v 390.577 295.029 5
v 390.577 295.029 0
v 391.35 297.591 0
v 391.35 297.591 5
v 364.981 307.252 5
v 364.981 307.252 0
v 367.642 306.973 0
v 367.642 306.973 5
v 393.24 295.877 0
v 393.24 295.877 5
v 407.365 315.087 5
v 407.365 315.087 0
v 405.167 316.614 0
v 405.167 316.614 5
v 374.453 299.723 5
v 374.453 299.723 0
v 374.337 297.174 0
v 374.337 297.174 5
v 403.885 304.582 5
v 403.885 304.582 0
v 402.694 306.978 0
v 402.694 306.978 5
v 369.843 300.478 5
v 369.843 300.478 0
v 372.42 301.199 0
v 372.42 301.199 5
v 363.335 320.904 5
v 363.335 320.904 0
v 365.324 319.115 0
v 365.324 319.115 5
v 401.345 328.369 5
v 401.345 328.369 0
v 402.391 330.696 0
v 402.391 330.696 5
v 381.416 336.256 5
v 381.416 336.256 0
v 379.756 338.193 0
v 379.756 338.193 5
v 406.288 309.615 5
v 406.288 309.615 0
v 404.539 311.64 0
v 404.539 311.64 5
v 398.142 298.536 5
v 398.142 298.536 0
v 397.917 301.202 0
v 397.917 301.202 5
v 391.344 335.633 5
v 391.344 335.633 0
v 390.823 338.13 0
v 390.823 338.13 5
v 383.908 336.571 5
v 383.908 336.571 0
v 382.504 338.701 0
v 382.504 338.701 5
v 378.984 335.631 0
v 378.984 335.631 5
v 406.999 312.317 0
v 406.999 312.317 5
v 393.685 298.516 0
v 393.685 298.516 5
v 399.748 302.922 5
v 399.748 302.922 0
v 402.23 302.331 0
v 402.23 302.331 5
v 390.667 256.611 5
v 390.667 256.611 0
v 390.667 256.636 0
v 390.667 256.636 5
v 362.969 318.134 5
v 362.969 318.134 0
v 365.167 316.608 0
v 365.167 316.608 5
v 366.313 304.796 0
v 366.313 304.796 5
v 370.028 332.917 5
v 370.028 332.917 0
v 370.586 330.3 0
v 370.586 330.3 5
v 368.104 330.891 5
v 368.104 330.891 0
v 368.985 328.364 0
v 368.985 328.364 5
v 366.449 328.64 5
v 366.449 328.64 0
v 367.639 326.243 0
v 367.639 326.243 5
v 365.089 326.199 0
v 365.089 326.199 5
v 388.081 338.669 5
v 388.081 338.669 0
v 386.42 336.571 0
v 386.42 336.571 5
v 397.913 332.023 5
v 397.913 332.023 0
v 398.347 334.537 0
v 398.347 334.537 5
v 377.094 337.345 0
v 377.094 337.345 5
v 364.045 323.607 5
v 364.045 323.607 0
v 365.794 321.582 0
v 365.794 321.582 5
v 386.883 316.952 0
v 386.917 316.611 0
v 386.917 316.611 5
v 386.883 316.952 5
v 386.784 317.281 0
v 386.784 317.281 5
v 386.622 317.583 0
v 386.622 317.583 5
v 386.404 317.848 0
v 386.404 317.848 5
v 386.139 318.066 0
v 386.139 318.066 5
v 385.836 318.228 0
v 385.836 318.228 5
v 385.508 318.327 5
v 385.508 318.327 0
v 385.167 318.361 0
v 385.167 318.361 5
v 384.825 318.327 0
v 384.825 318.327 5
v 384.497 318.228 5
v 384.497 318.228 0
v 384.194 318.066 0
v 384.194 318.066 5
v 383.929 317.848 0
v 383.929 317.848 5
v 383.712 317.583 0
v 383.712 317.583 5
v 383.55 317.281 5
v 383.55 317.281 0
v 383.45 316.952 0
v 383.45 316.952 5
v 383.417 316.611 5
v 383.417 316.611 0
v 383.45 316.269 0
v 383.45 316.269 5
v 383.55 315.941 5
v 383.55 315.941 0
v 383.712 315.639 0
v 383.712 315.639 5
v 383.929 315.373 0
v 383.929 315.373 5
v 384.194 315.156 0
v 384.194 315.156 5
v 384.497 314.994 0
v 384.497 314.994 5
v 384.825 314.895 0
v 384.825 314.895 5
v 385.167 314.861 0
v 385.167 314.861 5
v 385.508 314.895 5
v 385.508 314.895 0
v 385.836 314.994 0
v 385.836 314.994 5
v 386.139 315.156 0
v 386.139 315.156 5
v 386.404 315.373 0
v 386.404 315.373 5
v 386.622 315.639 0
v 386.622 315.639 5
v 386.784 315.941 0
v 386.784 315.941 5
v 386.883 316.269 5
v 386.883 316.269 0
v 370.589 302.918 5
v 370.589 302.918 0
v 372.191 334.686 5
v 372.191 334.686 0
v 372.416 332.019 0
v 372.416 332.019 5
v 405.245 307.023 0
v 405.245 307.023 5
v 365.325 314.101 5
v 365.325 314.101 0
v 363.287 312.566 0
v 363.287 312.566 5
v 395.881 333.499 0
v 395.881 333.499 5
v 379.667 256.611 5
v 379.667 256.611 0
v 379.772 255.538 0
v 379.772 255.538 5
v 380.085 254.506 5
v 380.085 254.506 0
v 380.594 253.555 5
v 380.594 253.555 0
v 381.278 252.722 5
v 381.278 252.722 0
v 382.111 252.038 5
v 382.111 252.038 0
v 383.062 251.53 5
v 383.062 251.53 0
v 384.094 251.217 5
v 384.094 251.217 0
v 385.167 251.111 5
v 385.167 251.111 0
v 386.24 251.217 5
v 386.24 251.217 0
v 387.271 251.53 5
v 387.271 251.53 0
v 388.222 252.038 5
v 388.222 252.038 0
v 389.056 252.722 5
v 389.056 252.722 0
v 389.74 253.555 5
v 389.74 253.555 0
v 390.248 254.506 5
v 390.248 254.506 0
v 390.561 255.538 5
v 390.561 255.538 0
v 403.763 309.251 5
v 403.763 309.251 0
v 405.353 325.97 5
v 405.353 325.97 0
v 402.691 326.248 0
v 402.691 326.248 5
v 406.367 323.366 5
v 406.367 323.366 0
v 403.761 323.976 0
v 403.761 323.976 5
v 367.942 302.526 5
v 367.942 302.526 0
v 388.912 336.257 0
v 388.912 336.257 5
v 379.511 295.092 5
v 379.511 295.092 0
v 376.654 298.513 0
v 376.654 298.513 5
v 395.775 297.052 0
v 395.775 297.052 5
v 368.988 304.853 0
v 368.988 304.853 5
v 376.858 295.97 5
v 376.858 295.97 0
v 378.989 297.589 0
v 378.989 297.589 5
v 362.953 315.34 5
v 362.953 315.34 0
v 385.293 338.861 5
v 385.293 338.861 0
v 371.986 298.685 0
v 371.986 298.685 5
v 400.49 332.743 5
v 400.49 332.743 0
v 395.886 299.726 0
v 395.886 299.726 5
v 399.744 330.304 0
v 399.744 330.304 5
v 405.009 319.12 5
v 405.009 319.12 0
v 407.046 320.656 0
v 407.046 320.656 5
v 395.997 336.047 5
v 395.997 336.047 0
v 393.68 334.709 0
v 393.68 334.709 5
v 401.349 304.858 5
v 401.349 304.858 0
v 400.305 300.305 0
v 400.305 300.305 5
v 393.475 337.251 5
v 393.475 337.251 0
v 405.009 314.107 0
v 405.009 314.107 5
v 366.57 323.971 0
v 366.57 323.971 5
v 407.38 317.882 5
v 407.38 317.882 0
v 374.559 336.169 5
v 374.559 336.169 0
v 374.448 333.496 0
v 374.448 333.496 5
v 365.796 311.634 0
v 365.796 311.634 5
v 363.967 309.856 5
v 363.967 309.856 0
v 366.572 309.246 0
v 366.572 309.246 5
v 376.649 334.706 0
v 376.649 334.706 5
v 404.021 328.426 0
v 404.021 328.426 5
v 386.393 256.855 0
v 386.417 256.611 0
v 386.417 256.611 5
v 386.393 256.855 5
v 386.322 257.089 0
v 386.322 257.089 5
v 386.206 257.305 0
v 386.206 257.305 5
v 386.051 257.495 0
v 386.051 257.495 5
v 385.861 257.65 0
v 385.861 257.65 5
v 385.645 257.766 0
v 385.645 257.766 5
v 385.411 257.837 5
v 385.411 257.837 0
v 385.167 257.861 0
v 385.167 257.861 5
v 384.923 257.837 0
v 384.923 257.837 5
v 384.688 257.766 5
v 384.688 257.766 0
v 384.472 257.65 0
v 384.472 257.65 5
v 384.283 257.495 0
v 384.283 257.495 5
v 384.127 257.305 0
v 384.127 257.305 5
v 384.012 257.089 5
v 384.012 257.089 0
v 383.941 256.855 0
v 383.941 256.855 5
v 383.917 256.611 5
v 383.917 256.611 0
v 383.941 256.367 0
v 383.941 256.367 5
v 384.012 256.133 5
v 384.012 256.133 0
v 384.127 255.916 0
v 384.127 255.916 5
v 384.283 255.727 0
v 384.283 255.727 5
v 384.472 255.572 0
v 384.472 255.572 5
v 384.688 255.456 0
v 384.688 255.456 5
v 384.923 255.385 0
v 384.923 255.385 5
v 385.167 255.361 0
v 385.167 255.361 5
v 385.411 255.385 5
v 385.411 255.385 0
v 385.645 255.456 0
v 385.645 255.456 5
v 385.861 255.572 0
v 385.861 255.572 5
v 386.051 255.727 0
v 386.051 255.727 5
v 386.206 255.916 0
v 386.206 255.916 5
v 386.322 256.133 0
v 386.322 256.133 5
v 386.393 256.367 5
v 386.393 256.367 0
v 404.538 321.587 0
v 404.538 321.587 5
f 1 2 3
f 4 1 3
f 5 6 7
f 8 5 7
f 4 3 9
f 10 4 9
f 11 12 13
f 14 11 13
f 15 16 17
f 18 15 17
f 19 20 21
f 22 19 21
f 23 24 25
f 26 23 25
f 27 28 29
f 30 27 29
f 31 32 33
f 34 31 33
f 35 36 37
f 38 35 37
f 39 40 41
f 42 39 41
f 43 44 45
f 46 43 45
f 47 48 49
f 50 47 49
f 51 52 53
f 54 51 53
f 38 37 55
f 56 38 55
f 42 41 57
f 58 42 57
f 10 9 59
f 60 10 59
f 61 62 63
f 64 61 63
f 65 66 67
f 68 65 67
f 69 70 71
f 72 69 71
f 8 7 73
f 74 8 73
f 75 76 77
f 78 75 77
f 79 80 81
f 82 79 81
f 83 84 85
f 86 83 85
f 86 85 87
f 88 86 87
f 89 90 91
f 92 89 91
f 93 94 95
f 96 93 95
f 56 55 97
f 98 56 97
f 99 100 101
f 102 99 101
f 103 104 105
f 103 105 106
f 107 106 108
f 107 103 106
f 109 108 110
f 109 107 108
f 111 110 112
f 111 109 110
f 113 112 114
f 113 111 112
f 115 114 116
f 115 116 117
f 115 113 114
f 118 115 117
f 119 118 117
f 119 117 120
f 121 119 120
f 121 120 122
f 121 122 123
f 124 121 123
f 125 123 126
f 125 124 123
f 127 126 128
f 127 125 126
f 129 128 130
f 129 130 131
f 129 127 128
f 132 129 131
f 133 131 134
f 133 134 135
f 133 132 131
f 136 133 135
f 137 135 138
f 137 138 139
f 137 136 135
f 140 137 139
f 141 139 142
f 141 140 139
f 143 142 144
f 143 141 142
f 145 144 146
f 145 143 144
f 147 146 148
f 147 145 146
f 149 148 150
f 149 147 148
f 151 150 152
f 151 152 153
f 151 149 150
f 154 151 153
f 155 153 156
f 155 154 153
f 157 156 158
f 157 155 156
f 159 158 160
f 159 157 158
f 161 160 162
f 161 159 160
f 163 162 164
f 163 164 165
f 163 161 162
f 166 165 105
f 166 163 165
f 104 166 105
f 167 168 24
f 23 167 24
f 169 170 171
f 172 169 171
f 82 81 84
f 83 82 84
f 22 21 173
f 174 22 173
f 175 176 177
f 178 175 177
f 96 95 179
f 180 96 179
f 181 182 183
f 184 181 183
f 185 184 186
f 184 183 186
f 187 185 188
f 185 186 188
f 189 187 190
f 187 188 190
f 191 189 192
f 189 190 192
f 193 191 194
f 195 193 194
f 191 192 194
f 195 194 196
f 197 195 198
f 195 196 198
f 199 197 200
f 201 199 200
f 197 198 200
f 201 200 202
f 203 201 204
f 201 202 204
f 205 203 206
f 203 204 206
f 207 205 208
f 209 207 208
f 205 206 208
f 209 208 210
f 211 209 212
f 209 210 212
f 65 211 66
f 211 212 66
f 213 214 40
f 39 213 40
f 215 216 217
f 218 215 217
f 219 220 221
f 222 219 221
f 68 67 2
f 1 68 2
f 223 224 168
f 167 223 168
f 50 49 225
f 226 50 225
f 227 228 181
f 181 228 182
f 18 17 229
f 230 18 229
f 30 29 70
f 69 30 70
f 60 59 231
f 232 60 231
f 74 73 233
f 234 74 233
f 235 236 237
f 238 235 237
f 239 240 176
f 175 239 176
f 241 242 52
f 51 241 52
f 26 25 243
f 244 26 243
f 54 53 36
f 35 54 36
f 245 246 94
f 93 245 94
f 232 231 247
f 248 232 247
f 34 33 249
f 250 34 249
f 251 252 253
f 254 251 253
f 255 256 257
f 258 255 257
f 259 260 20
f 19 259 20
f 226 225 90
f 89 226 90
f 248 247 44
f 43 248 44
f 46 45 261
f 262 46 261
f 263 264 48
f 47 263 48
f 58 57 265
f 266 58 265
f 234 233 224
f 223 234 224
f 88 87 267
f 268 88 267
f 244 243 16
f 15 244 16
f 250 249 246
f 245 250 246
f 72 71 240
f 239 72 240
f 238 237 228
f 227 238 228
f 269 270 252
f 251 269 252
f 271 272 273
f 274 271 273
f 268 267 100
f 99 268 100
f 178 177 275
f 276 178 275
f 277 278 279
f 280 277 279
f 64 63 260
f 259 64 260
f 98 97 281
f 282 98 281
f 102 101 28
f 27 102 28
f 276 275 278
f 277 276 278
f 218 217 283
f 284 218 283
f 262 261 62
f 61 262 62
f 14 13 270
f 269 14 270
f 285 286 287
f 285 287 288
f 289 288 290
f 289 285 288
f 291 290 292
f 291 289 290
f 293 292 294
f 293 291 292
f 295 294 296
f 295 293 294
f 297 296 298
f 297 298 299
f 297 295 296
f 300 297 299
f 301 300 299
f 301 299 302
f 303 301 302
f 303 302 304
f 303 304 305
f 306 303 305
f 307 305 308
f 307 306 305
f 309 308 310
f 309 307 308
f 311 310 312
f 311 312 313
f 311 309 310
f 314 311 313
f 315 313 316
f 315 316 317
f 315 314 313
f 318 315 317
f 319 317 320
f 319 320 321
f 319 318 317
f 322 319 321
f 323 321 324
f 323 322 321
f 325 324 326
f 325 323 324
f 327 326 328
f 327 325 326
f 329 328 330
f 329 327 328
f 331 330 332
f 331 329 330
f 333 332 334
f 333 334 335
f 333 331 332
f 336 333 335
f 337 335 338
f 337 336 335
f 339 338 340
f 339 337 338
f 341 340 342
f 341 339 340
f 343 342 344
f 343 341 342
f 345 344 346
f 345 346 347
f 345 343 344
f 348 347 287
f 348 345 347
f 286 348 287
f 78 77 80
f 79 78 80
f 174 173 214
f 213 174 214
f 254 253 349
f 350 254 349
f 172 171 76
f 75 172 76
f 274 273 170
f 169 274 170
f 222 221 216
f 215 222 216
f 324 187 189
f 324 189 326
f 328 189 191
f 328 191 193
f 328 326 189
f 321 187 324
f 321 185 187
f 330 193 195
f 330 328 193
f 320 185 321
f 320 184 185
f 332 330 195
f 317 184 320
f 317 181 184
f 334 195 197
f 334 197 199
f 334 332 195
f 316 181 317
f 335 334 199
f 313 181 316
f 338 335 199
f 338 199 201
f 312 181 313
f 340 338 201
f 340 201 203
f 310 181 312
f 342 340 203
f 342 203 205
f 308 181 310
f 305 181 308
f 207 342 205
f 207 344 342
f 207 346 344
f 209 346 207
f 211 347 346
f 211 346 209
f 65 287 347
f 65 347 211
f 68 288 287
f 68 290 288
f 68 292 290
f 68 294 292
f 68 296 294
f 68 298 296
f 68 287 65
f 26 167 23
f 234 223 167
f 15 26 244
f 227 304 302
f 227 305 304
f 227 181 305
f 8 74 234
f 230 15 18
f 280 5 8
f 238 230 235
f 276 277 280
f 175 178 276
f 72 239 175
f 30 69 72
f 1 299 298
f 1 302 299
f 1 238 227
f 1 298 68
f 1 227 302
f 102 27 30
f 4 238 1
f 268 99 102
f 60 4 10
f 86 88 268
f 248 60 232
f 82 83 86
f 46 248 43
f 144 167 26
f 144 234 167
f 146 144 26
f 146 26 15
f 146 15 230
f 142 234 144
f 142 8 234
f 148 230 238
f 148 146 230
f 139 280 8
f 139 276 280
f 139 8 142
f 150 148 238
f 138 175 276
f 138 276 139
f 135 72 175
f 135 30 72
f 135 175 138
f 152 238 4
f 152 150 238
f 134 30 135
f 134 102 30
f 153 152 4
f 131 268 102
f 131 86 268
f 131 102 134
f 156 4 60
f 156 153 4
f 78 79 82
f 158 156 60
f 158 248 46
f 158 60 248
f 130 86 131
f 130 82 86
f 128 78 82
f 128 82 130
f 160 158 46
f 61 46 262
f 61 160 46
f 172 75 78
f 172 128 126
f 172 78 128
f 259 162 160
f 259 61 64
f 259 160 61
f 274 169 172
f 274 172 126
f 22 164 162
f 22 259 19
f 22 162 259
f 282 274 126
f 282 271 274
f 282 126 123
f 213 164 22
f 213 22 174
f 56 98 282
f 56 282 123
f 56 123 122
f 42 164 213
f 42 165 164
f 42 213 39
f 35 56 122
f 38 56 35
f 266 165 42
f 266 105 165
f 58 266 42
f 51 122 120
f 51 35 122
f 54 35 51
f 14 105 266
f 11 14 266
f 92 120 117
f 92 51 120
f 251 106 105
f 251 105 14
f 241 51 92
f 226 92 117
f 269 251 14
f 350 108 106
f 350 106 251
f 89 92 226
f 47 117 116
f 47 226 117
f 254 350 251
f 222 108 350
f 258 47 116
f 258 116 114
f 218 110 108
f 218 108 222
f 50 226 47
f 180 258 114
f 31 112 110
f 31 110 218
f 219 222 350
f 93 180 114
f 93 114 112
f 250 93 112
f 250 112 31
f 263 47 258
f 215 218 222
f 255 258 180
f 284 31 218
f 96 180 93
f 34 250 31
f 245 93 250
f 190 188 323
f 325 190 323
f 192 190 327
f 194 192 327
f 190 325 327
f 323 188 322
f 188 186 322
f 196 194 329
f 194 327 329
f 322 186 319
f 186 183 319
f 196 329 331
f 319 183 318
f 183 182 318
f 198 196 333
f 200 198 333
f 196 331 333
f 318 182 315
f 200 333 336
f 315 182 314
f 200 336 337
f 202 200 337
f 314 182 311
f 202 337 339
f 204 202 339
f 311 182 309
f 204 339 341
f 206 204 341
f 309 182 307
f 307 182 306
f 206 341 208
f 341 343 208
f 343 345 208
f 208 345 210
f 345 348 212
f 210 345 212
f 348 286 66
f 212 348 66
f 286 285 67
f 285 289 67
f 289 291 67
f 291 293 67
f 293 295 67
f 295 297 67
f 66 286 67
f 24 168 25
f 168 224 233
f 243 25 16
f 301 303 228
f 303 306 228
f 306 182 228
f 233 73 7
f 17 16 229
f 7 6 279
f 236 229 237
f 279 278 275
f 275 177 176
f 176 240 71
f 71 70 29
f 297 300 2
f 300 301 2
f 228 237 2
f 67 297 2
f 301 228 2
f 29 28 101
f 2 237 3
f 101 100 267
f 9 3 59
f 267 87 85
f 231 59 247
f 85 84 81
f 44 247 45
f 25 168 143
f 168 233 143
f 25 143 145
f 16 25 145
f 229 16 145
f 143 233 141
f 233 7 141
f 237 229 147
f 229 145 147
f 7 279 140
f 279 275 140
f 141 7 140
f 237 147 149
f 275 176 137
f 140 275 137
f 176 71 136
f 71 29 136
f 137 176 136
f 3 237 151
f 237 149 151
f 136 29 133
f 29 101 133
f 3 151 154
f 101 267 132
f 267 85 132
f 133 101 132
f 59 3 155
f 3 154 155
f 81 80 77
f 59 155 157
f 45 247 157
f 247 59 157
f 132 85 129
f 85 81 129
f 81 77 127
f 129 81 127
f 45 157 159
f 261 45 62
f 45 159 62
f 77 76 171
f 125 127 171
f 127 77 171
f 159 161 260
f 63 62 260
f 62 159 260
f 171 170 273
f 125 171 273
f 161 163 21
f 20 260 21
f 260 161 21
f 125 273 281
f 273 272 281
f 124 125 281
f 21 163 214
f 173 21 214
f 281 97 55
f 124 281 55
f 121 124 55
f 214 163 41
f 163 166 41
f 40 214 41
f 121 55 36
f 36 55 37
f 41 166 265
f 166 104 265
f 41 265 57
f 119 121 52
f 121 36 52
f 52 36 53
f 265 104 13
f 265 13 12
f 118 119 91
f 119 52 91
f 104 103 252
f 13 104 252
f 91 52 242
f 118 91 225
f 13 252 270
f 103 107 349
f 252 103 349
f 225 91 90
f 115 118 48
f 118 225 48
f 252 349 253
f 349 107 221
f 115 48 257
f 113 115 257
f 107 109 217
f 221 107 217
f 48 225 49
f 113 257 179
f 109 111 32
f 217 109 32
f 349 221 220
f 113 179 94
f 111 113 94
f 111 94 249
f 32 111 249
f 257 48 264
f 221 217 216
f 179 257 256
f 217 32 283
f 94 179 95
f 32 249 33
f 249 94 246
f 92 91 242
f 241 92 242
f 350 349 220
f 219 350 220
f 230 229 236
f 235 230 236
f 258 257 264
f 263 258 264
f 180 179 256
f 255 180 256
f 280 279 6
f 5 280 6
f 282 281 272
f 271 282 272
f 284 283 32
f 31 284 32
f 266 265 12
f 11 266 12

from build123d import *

# Parameters (mm, degrees)
SKETCH1_R           = 1.25
SKETCH1_R_2         = 1.75
BOSS_EXTRUDE2_DEPTH = 5


with BuildPart() as part:
    # Sketch1 → Boss-Extrude2 (new body)
    with BuildSketch(Plane.XY):
        with BuildLine():
            Line((386.419721239, 336.571497364), (385.293365012, 338.860526411))
            Line((385.293365012, 338.860526411), (383.908113185, 336.571143013))
            Line((383.908113185, 336.571143013), (382.503747201, 338.700952515))
            Line((382.503747201, 338.700952515), (381.416354322, 336.256003497))
            Line((381.416354322, 336.256003497), (379.756126272, 338.193005085))
            Line((379.756126272, 338.193005085), (378.983741177, 335.631048754))
            Line((378.983741177, 335.631048754), (377.093833849, 337.344694757))
            Line((377.093833849, 337.344694757), (376.648637512, 334.706134696))
            Line((376.648637512, 334.706134696), (374.558855873, 336.169399891))
            Line((374.558855873, 336.169399891), (374.447869306, 333.495847767))
            Line((374.447869306, 333.495847767), (372.191170461, 334.685655589))
            Line((372.191170461, 334.685655589), (372.41614399, 332.019274917))
            Line((372.41614399, 332.019274917), (370.028117427, 332.916861386))
            Line((370.028117427, 332.916861386), (370.585503084, 330.299702582))
            Line((370.585503084, 330.299702582), (368.10380941, 330.890912222))
            Line((368.10380941, 330.890912222), (368.98481689, 328.364249444))
            Line((368.98481689, 328.364249444), (366.448593896, 328.639758526))
            Line((366.448593896, 328.639758526), (367.639329184, 326.243438755))
            Line((367.639329184, 326.243438755), (365.088574622, 326.198902337))
            Line((365.088574622, 326.198902337), (366.570259113, 323.970716967))
            Line((366.570259113, 323.970716967), (364.045199905, 323.606837414))
            Line((364.045199905, 323.606837414), (365.794466549, 321.58192626))
            Line((365.794466549, 321.58192626), (363.334924388, 320.904442171))
            Line((363.334924388, 320.904442171), (365.324186205, 319.114739291))
            Line((365.324186205, 319.114739291), (362.96894954, 318.134334994))
            Line((362.96894954, 318.134334994), (365.166834682, 316.608065071))
            Line((365.166834682, 316.608065071), (362.953047003, 315.340202129))
            Line((362.953047003, 315.340202129), (365.324893508, 314.101435352))
            Line((365.324893508, 314.101435352), (363.287467569, 312.566108719))
            Line((363.287467569, 312.566108719), (365.795870002, 311.63438118))
            Line((365.795870002, 311.63438118), (363.966937226, 309.855803875))
            Line((363.966937226, 309.855803875), (366.572336582, 309.245809474))
            Line((366.572336582, 309.245809474), (364.980740332, 307.252030724))
            Line((364.980740332, 307.252030724), (367.642047906, 306.973389437))
            Line((367.642047906, 306.973389437), (366.312888606, 304.795852323))
            Line((366.312888606, 304.795852323), (368.988133989, 304.85295849))
            Line((368.988133989, 304.85295849), (367.942373274, 302.526004073))
            Line((367.942373274, 302.526004073), (370.589366248, 302.917957095))
            Line((370.589366248, 302.917957095), (369.84349639, 300.478282837))
            Line((369.84349639, 300.478282837), (372.420492294, 301.198901382))
            Line((372.420492294, 301.198901382), (371.986276106, 298.684982403))
            Line((371.986276106, 298.684982403), (374.452634175, 299.722901884))
            Line((374.452634175, 299.722901884), (374.336919507, 297.174384188))
            Line((374.336919507, 297.174384188), (376.653743801, 298.513235996))
            Line((376.653743801, 298.513235996), (376.85835554, 295.97031123))
            Line((376.85835554, 295.97031123), (378.989108357, 297.588980872))
            Line((378.989108357, 297.588980872), (379.510819655, 295.091752478))
            Line((379.510819655, 295.091752478), (379.666733337, 256.610886765))
            ThreePointArc((379.666733337, 256.610886765), (385.166733337, 251.110886765), (390.666733337, 256.610886765))
            Line((390.666733337, 256.610886765), (390.66667378, 256.636482058))
            Line((390.66667378, 256.636482058), (390.577340402, 295.028768444))
            Line((390.577340402, 295.028768444), (391.349725497, 297.590724775))
            Line((391.349725497, 297.590724775), (393.239632825, 295.877078772))
            Line((393.239632825, 295.877078772), (393.684829162, 298.515638833))
            Line((393.684829162, 298.515638833), (395.774610801, 297.052373638))
            Line((395.774610801, 297.052373638), (395.885597368, 299.725925762))
            Line((395.885597368, 299.725925762), (398.142296213, 298.53611794))
            Line((398.142296213, 298.53611794), (397.917322684, 301.202498612))
            Line((397.917322684, 301.202498612), (400.305349247, 300.304912143))
            Line((400.305349247, 300.304912143), (399.74796359, 302.922070947))
            Line((399.74796359, 302.922070947), (402.229657264, 302.330861307))
            Line((402.229657264, 302.330861307), (401.348649784, 304.857524085))
            Line((401.348649784, 304.857524085), (403.884872779, 304.582015003))
            Line((403.884872779, 304.582015003), (402.69413749, 306.978334774))
            Line((402.69413749, 306.978334774), (405.244892052, 307.022871192))
            Line((405.244892052, 307.022871192), (403.763207561, 309.251056562))
            Line((403.763207561, 309.251056562), (406.288266769, 309.614936115))
            Line((406.288266769, 309.614936115), (404.539000125, 311.639847269))
            Line((404.539000125, 311.639847269), (406.998542286, 312.317331358))
            Line((406.998542286, 312.317331358), (405.009280469, 314.107034238))
            Line((405.009280469, 314.107034238), (407.364517134, 315.087438535))
            Line((407.364517134, 315.087438535), (405.166631992, 316.613708458))
            Line((405.166631992, 316.613708458), (407.380419671, 317.8815714))
            Line((407.380419671, 317.8815714), (405.008573166, 319.120338177))
            Line((405.008573166, 319.120338177), (407.045999105, 320.65566481))
            Line((407.045999105, 320.65566481), (404.537596672, 321.587392349))
            Line((404.537596672, 321.587392349), (406.366529448, 323.365969654))
            Line((406.366529448, 323.365969654), (403.761130092, 323.975964055))
            Line((403.761130092, 323.975964055), (405.352726342, 325.969742805))
            Line((405.352726342, 325.969742805), (402.691418768, 326.248384092))
            Line((402.691418768, 326.248384092), (404.020578068, 328.425921206))
            Line((404.020578068, 328.425921206), (401.345332685, 328.368815039))
            Line((401.345332685, 328.368815039), (402.3910934, 330.695769456))
            Line((402.3910934, 330.695769456), (399.744100426, 330.303816434))
            Line((399.744100426, 330.303816434), (400.489970284, 332.743490692))
            Line((400.489970284, 332.743490692), (397.91297438, 332.022872147))
            Line((397.91297438, 332.022872147), (398.347190568, 334.536791126))
            Line((398.347190568, 334.536791126), (395.880832499, 333.498871645))
            Line((395.880832499, 333.498871645), (395.996547167, 336.047389341))
            Line((395.996547167, 336.047389341), (393.679722873, 334.708537533))
            Line((393.679722873, 334.708537533), (393.475111134, 337.251462299))
            Line((393.475111134, 337.251462299), (391.344358317, 335.632792657))
            Line((391.344358317, 335.632792657), (390.822647019, 338.130021051))
            Line((390.822647019, 338.130021051), (388.911568925, 336.257060962))
            Line((388.911568925, 336.257060962), (388.080985766, 338.6692102))
            Line((388.080985766, 338.6692102), (386.419721239, 336.571497364))
        make_face()
        with Locations((385.166733337, 256.610886765)):
            Circle(SKETCH1_R, mode=Mode.SUBTRACT)
        with Locations((385.166733337, 316.610886765)):
            Circle(SKETCH1_R_2, mode=Mode.SUBTRACT)
    extrude(amount=BOSS_EXTRUDE2_DEPTH)


solid = part.part
